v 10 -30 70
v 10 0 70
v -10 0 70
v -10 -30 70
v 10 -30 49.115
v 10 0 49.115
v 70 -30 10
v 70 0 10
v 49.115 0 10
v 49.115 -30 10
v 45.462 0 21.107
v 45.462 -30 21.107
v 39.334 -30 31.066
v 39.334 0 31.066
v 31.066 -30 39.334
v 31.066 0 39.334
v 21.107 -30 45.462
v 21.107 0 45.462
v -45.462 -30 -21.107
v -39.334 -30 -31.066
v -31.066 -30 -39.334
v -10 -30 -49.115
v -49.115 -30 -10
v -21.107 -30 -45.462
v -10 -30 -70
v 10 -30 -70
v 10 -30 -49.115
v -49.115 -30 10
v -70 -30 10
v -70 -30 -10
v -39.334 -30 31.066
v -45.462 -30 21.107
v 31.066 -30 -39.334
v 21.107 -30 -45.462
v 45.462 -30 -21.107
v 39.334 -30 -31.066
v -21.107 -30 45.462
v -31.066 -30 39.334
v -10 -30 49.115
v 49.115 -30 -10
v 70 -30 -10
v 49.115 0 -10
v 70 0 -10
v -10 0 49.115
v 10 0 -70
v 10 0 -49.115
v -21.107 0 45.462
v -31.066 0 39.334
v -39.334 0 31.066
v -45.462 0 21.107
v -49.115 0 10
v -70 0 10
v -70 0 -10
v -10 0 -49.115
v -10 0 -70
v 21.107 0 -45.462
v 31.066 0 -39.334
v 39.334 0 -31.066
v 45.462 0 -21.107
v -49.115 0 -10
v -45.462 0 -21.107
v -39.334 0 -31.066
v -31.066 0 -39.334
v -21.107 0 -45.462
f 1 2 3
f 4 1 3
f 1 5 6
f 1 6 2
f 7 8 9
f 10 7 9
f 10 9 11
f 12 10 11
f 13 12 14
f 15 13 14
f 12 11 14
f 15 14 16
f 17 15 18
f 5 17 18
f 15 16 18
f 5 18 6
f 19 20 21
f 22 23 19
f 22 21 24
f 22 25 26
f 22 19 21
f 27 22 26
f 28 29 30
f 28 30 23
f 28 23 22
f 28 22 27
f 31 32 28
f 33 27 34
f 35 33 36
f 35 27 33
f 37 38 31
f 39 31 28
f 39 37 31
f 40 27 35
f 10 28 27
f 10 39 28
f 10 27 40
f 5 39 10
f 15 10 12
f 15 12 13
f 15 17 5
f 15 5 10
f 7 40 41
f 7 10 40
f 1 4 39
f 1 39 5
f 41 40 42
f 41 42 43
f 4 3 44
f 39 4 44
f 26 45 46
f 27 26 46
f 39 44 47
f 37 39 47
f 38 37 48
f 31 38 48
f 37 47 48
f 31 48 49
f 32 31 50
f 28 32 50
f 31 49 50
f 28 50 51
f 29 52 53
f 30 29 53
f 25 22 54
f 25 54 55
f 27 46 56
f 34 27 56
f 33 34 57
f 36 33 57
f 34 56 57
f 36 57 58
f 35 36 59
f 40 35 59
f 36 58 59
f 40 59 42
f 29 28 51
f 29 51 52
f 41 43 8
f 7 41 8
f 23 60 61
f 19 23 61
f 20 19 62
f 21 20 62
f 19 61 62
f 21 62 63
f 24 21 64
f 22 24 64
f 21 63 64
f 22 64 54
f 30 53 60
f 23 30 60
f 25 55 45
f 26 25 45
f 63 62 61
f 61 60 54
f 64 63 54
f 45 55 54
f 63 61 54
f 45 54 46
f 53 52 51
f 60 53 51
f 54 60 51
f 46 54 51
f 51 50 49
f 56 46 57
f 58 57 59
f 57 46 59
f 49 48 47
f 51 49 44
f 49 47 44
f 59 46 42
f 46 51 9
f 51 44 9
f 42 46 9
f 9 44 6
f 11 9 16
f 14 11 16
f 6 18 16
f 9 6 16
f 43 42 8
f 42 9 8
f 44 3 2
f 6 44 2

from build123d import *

# Parameters (mm, degrees)
F0_R     = 40
F1_DEPTH = 30


with BuildPart() as f1:
    # F0 (on Front) → F1 (new body)
    with BuildSketch(Plane.XZ):
        with BuildLine():
            Line((70, 10), (49.114953, 10))
            ThreePointArc((49.114953, 10), (49.870079, 5.025321), (50.122636, 0))
            ThreePointArc((50.122636, 0), (49.870079, -5.025321), (49.114953, -10))
            Line((49.114953, -10), (70, -10))
            Line((70, -10), (70, 10))
        make_face()
        with BuildLine():
            ThreePointArc((10, 49.114953), (0, 50.122636), (-10, 49.114953))
            ThreePointArc((-10, 49.114953), (-35.442056, 35.442056), (-49.114953, 10))
            ThreePointArc((-49.114953, 10), (-50.122636, 0), (-49.114953, -10))
            ThreePointArc((-49.114953, -10), (-35.442056, -35.442056), (-10, -49.114953))
            ThreePointArc((-10, -49.114953), (0, -50.122636), (10, -49.114953))
            ThreePointArc((10, -49.114953), (35.442056, -35.442056), (49.114953, -10))
            ThreePointArc((49.114953, -10), (49.870079, -5.025321), (50.122636, 0))
            ThreePointArc((50.122636, 0), (49.870079, 5.025321), (49.114953, 10))
            ThreePointArc((49.114953, 10), (35.442056, 35.442056), (10, 49.114953))
        make_face()
        Circle(F0_R, mode=Mode.SUBTRACT)
        with BuildLine():
            ThreePointArc((-49.114953, -10), (-50.122636, 0), (-49.114953, 10))
            Line((-49.114953, 10), (-70, 10))
            Line((-70, 10), (-70, -10))
            Line((-70, -10), (-49.114953, -10))
        make_face()
        with BuildLine():
            ThreePointArc((10, -49.114953), (0, -50.122636), (-10, -49.114953))
            Line((-10, -49.114953), (-10, -70))
            Line((-10, -70), (10, -70))
            Line((10, -70), (10, -49.114953))
        make_face()
        with BuildLine():
            Line((-5.95824, 70), (-10, 70))
            Line((-10, 70), (-10, 49.114953))
            ThreePointArc((-10, 49.114953), (0, 50.122636), (10, 49.114953))
            Line((10, 49.114953), (10, 70))
            Line((10, 70), (5.95824, 70))
            Line((5.95824, 70), (-5.95824, 70))
        make_face()
        Circle(F0_R)
    extrude(amount=F1_DEPTH)


solid = f1.part
